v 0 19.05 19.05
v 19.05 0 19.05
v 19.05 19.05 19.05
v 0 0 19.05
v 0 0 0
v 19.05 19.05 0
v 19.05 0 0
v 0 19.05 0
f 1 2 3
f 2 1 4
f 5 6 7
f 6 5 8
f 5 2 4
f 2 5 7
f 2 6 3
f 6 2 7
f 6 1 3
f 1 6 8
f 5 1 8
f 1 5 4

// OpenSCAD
// file: ../../lib/conversion.scad
// metric
MM_PER_CM = 10;
CM_PER_METER = 100;

function mm_to_cm(mm) = mm / MM_PER_CM;

function mm_to_meters(mm) = mm_to_cm(mm) / CM_PER_METER;

function cm_to_mm(cm) = cm * MM_PER_CM;

function cm_to_meters(cm) = cm / CM_PER_METER;

function meters_to_cm(meters) = meters * CM_PER_METER;

function meters_to_mm(meters) = meters_to_cm(meters) * MM_PER_CM;

// imperial
INCHES_PER_FT = 12;

function inches_to_ft(inches) = inches / INCHES_PER_FT;

function ft_to_inches(ft) = ft * INCHES_PER_FT;

// metric to imperial
MM_PER_INCH = 25.4;

function mm_to_inches(mm) = mm / MM_PER_INCH;

function mm_to_ft(mm) = inches_to_ft(mm_to_inches(mm));

function cm_to_inches(cm) = mm_to_inches(cm_to_mm(cm));

function cm_to_ft(cm) = inches_to_ft(cm_to_inches(cm));

function meters_to_inches(meters) = mm_to_inches(meters_to_mm(meters));

function meters_to_ft(meters) = mm_to_ft(meters_to_mm(meters));

// imperial to metric
function inches_to_mm(inches) = inches * MM_PER_INCH;

function inches_to_cm(inches) = mm_to_cm(inches_to_mm(inches));

function inches_to_meters(inches) = mm_to_meters(inches_to_mm(inches));

function ft_to_mm(ft) = inches_to_mm(ft_to_inches(ft));

function ft_to_cm(ft) = inches_to_cm(ft_to_inches(ft));

function ft_to_meters(ft) = mm_to_meters(ft_to_mm(ft));
// main file
include <../../lib/conversion.scad>

// this is required for some of the conversions that result in some awkward fp numbers
function aprox_eq(a, b, epsilon=0.0001) = abs(a - b) < epsilon;

// metric
assert(mm_to_cm(10) == 1, "failed to convert mm -> cm");

assert(mm_to_meters(1000) == 1, "failed to convert mm -> meters");

assert(cm_to_mm(1) == 10, "failed to convert cm -> mm");

assert(cm_to_meters(100) == 1, "failed to convert cm to meters");

assert(meters_to_cm(1) == 100, "failed to convert meters to cm");

assert(meters_to_mm(1) == 1000, "failed to convert meters to mm");

// imperial
assert(inches_to_ft(12) == 1, "failed to convert inches -> ft");

assert(ft_to_inches(1) == 12, "failed to convert ft -> inches");

// metric to imperial
assert(mm_to_inches(25.4) == 1, "failed to convert mm -> inches");

assert(aprox_eq(mm_to_ft(304.8), 1), "failed to convert mm -> ft");

assert(cm_to_inches(2.54) == 1, "failed to convert cm -> inches");

assert(aprox_eq(cm_to_ft(30.48), 1), "failed to convert cm -> ft");

assert(aprox_eq(meters_to_inches(1), 39.3701), "failed to convert meters -> inches");

assert(aprox_eq(meters_to_ft(1), 3.28084), "failed to convert meters -> ft");

// imperial to metric
assert(inches_to_mm(1) == 25.4, "failed to convert inches -> mm");

assert(inches_to_cm(1) == 2.54, "failed to convert inches -> cm");

assert(aprox_eq(inches_to_meters(39.3701), 1), "failed to convert inches -> meters");

assert(aprox_eq(ft_to_mm(1), 304.8), "failed to convert ft -> mm");

assert(aprox_eq(ft_to_cm(1), 30.48), "failed to convert ft -> cm");

assert(aprox_eq(ft_to_meters(3.28084), 1), "failed to convert ft -> meters");

cube(inches_to_mm(3/4));
